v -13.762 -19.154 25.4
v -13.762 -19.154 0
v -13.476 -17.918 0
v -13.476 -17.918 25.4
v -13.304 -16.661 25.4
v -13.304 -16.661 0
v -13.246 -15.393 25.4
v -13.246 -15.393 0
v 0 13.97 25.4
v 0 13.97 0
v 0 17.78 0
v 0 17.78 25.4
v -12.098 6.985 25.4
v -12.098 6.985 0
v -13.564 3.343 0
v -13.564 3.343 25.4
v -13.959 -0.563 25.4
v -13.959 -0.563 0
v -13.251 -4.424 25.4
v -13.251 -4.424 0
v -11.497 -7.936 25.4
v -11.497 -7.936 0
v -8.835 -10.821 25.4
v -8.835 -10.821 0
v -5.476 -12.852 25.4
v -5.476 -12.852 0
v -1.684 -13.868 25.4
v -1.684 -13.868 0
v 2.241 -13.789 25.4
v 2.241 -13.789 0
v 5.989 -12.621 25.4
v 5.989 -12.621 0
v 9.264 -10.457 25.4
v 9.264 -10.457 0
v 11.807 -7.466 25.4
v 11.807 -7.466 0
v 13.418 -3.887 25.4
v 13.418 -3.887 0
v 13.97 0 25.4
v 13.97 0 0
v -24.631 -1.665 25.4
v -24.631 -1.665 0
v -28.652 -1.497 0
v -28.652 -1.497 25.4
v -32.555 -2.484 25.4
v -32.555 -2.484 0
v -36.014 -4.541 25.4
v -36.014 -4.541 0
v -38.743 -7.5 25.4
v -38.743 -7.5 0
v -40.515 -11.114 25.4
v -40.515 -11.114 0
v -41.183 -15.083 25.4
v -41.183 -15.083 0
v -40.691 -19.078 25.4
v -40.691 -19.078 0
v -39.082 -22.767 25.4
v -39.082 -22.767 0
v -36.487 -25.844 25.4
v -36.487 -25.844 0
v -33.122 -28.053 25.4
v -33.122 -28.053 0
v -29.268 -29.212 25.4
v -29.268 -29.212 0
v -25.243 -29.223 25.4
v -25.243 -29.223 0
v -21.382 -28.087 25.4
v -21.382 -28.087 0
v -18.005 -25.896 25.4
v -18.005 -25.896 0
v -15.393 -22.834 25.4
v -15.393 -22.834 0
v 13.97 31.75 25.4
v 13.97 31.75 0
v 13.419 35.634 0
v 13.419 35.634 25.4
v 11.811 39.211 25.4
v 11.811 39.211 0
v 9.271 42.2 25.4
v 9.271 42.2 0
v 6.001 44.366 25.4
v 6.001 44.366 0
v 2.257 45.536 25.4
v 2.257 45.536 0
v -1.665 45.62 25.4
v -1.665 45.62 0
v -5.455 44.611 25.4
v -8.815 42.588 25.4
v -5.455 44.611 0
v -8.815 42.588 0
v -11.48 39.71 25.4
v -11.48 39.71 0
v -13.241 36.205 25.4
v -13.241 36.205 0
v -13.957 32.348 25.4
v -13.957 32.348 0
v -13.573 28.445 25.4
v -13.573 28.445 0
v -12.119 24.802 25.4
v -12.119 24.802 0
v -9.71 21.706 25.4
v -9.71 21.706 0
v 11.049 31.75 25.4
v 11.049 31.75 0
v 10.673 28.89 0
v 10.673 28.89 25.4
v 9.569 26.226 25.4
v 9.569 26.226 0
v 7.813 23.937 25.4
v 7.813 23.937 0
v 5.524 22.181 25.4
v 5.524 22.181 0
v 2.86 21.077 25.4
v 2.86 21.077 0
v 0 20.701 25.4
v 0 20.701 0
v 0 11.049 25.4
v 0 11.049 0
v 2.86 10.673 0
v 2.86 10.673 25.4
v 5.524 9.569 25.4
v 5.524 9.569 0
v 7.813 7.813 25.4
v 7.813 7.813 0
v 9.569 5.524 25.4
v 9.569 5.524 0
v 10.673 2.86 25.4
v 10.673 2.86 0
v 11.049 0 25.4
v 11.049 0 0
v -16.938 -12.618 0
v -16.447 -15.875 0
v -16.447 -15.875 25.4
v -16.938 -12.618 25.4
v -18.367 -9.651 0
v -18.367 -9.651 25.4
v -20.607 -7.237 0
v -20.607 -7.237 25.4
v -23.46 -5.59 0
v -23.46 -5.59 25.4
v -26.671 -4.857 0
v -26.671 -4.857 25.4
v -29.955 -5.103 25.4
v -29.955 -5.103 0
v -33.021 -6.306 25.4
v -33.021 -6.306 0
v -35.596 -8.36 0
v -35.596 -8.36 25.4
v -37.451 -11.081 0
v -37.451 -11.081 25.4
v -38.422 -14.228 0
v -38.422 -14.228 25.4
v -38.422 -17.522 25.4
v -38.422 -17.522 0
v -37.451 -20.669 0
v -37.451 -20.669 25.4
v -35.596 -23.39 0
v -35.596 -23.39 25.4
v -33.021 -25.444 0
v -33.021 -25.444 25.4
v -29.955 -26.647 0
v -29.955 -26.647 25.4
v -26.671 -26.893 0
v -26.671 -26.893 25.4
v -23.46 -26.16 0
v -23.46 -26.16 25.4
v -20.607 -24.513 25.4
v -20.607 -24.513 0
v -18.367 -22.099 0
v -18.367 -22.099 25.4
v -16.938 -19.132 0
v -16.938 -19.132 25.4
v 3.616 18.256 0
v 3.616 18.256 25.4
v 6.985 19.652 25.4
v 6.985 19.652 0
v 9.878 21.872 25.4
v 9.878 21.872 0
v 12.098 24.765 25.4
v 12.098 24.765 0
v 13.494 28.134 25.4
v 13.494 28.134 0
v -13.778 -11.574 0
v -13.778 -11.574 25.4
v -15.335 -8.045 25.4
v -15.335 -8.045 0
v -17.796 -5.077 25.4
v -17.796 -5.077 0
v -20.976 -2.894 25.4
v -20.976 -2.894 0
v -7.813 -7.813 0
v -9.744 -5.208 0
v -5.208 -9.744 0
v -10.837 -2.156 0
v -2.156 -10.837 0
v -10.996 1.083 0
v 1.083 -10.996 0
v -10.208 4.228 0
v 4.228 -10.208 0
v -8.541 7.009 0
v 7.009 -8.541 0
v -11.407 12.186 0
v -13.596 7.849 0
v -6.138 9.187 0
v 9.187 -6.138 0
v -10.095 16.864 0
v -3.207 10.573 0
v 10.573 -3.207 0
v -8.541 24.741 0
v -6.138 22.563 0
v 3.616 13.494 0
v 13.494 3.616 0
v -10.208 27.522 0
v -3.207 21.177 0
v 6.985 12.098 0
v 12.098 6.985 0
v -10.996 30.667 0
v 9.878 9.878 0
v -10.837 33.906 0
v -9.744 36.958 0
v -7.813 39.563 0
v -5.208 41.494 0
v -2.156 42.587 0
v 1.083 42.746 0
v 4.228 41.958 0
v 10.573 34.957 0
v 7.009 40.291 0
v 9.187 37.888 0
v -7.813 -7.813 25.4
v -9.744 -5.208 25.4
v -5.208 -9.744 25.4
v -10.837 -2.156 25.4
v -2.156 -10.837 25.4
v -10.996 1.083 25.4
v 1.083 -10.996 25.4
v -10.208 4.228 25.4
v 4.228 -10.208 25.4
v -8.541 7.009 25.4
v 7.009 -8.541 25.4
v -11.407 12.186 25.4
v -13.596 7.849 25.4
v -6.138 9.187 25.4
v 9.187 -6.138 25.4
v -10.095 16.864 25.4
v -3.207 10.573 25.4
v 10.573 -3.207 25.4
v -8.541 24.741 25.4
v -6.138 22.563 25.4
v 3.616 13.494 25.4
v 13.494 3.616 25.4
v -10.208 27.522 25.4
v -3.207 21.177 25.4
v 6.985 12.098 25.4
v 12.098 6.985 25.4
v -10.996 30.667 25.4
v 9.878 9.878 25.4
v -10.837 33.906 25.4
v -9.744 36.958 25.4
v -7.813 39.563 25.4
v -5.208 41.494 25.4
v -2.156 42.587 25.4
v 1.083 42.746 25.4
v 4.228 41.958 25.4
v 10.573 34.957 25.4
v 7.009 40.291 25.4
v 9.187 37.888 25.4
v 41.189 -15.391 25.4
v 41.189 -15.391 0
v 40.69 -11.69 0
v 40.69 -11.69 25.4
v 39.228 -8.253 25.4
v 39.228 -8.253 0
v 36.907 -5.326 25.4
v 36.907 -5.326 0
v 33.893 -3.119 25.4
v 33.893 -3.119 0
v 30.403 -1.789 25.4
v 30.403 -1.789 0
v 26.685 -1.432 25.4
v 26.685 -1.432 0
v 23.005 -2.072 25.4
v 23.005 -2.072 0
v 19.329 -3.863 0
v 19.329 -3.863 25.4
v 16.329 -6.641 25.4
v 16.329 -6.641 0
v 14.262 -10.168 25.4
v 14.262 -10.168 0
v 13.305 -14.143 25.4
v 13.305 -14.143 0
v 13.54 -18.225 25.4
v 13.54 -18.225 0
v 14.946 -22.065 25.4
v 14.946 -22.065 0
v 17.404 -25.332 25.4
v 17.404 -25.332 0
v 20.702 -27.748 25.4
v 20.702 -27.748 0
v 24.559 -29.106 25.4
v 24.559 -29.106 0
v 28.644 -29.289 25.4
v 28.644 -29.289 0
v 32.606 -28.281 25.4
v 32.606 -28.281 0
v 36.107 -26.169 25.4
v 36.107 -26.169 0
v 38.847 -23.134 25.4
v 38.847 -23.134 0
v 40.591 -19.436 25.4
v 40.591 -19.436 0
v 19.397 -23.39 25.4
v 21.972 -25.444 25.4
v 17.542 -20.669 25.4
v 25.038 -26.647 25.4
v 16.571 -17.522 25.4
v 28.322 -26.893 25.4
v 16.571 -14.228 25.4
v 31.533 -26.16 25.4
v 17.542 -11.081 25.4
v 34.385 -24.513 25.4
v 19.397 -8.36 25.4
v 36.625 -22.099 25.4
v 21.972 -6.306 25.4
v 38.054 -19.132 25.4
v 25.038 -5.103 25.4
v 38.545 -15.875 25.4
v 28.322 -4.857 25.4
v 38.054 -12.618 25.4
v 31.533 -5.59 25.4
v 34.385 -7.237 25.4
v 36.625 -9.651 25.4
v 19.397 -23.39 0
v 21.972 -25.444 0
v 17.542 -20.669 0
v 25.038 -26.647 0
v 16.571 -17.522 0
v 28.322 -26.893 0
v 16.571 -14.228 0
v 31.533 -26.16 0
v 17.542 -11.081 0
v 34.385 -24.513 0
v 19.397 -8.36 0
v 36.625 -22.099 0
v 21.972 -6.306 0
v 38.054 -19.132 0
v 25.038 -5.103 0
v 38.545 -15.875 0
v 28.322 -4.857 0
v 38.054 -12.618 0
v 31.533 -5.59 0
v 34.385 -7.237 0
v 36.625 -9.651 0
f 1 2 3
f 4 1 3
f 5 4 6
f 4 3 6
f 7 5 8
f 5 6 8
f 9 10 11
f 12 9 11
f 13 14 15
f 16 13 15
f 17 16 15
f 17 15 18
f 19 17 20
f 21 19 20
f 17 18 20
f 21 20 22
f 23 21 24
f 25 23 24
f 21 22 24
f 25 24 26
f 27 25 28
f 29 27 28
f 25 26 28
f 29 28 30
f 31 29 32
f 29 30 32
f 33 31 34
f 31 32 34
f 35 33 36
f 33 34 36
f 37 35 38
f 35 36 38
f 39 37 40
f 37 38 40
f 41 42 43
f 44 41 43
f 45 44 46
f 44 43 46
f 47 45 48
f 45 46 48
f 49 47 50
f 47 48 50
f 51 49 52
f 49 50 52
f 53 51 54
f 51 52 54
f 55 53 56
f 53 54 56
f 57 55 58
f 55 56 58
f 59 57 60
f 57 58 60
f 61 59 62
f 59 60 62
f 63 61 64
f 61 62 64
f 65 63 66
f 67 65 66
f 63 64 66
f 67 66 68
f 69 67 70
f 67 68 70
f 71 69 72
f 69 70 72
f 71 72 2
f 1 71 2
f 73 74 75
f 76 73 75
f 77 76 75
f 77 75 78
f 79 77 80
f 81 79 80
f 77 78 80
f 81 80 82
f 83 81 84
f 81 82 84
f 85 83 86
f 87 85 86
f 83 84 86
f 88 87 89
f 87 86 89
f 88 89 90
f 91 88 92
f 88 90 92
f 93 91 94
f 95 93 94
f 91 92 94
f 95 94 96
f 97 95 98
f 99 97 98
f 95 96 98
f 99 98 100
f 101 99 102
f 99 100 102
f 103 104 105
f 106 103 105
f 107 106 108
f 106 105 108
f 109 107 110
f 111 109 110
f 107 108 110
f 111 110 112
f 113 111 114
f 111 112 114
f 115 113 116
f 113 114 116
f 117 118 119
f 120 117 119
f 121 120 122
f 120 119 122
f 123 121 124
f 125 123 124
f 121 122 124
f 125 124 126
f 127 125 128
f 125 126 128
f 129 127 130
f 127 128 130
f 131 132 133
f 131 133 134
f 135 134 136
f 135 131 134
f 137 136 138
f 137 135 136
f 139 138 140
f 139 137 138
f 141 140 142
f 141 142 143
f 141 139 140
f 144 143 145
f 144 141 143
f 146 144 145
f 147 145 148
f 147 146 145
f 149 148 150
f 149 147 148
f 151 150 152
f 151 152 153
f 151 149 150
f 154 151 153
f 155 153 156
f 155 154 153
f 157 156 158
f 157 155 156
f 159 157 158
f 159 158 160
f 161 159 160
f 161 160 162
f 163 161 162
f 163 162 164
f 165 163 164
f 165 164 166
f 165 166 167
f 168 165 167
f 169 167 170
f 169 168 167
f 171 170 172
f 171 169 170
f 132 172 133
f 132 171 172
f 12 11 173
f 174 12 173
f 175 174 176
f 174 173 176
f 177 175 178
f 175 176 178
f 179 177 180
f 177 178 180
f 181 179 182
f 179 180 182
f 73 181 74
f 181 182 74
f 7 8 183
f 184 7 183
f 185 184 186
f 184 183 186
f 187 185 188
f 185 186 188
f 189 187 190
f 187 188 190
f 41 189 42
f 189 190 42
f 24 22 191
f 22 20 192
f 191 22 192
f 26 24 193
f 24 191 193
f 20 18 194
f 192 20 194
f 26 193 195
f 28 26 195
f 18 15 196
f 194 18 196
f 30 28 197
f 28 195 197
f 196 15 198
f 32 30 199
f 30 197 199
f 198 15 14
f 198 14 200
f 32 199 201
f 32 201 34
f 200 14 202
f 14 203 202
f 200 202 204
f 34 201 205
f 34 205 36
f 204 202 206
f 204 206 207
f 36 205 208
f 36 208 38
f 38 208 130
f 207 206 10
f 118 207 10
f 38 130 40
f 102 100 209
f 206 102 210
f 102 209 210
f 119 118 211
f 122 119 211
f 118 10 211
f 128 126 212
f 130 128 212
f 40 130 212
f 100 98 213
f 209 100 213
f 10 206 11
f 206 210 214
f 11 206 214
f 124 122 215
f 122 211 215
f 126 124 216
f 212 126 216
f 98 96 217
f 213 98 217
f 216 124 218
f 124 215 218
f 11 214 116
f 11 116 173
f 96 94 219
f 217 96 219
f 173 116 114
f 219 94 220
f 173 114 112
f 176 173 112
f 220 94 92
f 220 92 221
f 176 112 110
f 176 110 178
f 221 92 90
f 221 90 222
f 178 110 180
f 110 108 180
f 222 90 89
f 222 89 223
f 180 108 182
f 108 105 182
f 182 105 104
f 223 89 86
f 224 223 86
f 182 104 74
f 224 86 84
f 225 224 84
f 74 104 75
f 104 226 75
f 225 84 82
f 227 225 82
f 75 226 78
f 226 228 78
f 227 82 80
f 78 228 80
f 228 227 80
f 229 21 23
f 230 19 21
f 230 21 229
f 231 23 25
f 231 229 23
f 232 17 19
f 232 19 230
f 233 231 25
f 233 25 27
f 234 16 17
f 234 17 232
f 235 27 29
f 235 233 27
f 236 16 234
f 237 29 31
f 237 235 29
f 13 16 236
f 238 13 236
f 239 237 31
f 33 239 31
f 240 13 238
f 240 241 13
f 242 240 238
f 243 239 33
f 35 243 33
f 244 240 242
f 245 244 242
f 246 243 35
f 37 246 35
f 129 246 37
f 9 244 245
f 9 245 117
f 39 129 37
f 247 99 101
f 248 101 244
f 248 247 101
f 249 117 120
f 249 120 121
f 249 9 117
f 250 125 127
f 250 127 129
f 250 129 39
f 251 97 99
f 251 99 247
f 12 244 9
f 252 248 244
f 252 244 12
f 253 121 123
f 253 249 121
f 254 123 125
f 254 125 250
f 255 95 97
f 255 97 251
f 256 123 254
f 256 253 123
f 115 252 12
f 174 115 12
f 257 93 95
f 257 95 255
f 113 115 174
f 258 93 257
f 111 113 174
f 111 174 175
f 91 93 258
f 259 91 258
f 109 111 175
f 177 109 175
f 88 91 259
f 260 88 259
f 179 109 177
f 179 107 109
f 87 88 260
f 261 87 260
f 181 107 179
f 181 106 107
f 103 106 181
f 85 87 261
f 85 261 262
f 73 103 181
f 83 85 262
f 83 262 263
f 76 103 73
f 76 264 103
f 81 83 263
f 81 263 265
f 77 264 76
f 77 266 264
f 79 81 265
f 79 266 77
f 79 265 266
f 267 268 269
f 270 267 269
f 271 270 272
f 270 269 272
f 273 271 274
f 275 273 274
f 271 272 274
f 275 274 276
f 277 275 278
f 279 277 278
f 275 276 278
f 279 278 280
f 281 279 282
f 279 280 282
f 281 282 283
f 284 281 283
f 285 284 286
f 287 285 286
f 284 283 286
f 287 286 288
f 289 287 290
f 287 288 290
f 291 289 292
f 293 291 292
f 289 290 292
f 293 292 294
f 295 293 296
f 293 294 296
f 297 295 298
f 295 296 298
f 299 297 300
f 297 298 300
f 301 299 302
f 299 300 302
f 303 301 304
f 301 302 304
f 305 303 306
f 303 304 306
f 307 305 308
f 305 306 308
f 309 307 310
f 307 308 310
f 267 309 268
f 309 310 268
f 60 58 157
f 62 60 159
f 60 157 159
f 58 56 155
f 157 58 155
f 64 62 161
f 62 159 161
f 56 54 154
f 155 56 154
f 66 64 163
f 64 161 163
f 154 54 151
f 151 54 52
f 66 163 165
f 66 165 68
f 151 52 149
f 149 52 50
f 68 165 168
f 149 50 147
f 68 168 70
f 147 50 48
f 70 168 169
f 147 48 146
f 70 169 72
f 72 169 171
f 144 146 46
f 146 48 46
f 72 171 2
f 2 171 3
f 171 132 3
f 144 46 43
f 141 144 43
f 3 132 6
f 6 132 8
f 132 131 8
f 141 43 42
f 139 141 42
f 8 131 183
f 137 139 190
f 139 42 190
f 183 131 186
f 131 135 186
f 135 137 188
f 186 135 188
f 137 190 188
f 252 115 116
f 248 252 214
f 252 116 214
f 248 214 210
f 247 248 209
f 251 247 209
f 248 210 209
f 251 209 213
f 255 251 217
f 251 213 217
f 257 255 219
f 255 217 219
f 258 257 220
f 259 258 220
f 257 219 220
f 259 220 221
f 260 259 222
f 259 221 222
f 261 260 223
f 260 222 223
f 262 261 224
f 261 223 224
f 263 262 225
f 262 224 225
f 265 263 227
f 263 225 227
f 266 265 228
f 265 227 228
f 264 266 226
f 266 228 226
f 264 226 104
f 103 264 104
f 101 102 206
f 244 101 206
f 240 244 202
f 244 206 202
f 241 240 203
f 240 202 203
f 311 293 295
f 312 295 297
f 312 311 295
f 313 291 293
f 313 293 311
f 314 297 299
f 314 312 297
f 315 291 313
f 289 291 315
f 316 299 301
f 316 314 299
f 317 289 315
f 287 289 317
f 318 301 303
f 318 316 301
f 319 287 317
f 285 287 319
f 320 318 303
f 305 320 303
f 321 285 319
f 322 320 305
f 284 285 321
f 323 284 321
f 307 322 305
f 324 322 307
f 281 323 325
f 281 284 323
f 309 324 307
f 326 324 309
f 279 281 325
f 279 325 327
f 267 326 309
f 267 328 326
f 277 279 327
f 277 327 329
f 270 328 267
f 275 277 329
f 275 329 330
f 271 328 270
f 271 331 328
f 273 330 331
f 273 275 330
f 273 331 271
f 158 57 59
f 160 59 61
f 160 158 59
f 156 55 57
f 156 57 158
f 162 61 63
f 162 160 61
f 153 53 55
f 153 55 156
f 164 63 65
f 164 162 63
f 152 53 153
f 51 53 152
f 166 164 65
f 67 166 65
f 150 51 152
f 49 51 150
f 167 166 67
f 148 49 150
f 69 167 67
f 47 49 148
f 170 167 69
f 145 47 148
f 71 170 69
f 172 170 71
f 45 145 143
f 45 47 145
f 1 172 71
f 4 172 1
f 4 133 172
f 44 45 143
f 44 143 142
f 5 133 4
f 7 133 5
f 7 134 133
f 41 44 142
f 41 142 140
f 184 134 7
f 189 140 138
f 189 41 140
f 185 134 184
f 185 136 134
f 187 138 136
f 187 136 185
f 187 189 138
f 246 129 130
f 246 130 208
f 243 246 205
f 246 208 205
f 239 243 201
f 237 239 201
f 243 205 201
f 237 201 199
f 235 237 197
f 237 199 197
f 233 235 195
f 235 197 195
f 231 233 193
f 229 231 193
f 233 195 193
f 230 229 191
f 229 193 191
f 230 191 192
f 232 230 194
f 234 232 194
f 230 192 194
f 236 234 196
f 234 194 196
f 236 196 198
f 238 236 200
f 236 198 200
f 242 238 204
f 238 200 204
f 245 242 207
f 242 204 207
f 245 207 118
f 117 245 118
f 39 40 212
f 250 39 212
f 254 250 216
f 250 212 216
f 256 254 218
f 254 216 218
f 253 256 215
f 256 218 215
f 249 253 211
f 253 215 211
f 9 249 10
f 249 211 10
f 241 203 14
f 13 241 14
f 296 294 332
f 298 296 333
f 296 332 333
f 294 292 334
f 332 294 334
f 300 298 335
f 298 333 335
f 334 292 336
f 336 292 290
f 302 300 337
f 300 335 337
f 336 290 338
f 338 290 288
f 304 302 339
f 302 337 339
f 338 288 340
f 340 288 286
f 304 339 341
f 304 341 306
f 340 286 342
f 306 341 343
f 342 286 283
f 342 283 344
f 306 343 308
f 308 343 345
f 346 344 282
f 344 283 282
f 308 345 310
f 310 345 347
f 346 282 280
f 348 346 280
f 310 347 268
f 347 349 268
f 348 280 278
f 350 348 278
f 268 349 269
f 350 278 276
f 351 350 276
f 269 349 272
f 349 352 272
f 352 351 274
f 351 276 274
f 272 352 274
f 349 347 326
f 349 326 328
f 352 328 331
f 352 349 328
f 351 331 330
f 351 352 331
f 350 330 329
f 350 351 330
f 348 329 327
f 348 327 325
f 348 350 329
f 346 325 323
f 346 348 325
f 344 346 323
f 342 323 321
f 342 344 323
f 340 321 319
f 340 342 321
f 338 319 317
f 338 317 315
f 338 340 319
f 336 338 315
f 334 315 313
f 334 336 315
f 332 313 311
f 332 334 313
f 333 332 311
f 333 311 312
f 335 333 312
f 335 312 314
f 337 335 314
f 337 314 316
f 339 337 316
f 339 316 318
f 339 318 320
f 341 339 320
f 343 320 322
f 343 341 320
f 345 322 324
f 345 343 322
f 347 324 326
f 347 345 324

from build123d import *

# Parameters (mm, degrees)
F1_DEPTH = 25.4
F0_R     = 11.049


with BuildPart() as f1:
    # F0 (on Top) → F1 (new body)
    with BuildSketch(Plane.XY):
        with BuildLine():
            ThreePointArc((0, 11.049), (7.8128228253, 7.8128228253), (11.049, 0))
            ThreePointArc((11.049, 0), (-2.8596916293, -10.6725144547), (-9.5687146864, 5.5245))
            Line((-9.5687146864, 5.5245), (-12.0983748909, 6.985))
            ThreePointArc((-12.0983748909, 6.985), (-3.6157020601, -13.4939837933), (13.97, 0))
            ThreePointArc((13.97, 0), (9.8782817332, 9.8782817332), (0, 13.97))
            Line((0, 13.97), (0, 11.049))
        make_face()
        with BuildLine():
            ThreePointArc((-9.5687146864, 5.5245), (-5.5245, 9.5687146864), (0, 11.049))
            Line((0, 11.049), (0, 13.97))
            ThreePointArc((0, 13.97), (-6.985, 12.0983748909), (-12.0983748909, 6.985))
            Line((-12.0983748909, 6.985), (-9.5687146864, 5.5245))
        make_face()
        with BuildLine():
            ThreePointArc((-12.0983748909, 6.985), (-6.985, 12.0983748909), (0, 13.97))
            Line((0, 13.97), (0, 17.78))
            ThreePointArc((0, 17.78), (-5.2369846592, 18.7987494164), (-9.7101647279, 21.706414935))
            ThreePointArc((-9.7101647279, 21.706414935), (-10.6373226429, 14.4931657481), (-13.5956756423, 7.8494669919))
            Line((-13.5956756423, 7.8494669919), (-12.0983748909, 6.985))
        make_face()
        with BuildLine():
            ThreePointArc((-9.7101647279, 21.706414935), (-5.2369846592, 18.7987494164), (0, 17.78))
            ThreePointArc((0, 17.78), (9.8782817332, 21.8717182668), (13.97, 31.75))
            ThreePointArc((13.97, 31.75), (-5.454809747, 44.611024478), (-9.7101647279, 21.706414935))
        make_face()
        with BuildLine():
            ThreePointArc((11.049, 31.75), (7.8128228253, 23.9371771747), (0, 20.701))
            ThreePointArc((0, 20.701), (-7.8128228253, 39.5628228253), (11.049, 31.75))
        make_face(mode=Mode.SUBTRACT)
    extrude(amount=F1_DEPTH)


with BuildPart() as f1b:
    # F0 (on Top) → F1, piece 2 (new body)
    with BuildSketch(Plane.XY):
        with BuildLine():
            ThreePointArc((-13.24606908, -15.3932316846), (-16.4625654972, -6.4756613489), (-24.6309023934, -1.6645094862))
            ThreePointArc((-24.6309023934, -1.6645094862), (-39.0815540225, -22.7669123856), (-13.7619331001, -19.1544980983))
            ThreePointArc((-13.7619331001, -19.1544980983), (-13.3756359286, -17.2914703895), (-13.24606908, -15.3932316846))
        make_face()
        with Locations((-27.4963065702, -15.875)):
            Circle(F0_R, mode=Mode.SUBTRACT)
    extrude(amount=F1_DEPTH)


with BuildPart() as f1c:
    # F0 (on Top) → F1, piece 3 (new body)
    with BuildSketch(Plane.XY):
        with BuildLine():
            ThreePointArc((23.0051975699, -2.0721487123), (18.9641650078, -26.6615281564), (41.1892017154, -15.3914230568))
            ThreePointArc((41.1892017154, -15.3914230568), (35.474238423, -4.1213179571), (23.0051975699, -2.0721487123))
        make_face()
        with Locations((27.4963065702, -15.875)):
            Circle(F0_R, mode=Mode.SUBTRACT)
    extrude(amount=F1_DEPTH)


solid = Compound([f1.part, f1b.part, f1c.part])
